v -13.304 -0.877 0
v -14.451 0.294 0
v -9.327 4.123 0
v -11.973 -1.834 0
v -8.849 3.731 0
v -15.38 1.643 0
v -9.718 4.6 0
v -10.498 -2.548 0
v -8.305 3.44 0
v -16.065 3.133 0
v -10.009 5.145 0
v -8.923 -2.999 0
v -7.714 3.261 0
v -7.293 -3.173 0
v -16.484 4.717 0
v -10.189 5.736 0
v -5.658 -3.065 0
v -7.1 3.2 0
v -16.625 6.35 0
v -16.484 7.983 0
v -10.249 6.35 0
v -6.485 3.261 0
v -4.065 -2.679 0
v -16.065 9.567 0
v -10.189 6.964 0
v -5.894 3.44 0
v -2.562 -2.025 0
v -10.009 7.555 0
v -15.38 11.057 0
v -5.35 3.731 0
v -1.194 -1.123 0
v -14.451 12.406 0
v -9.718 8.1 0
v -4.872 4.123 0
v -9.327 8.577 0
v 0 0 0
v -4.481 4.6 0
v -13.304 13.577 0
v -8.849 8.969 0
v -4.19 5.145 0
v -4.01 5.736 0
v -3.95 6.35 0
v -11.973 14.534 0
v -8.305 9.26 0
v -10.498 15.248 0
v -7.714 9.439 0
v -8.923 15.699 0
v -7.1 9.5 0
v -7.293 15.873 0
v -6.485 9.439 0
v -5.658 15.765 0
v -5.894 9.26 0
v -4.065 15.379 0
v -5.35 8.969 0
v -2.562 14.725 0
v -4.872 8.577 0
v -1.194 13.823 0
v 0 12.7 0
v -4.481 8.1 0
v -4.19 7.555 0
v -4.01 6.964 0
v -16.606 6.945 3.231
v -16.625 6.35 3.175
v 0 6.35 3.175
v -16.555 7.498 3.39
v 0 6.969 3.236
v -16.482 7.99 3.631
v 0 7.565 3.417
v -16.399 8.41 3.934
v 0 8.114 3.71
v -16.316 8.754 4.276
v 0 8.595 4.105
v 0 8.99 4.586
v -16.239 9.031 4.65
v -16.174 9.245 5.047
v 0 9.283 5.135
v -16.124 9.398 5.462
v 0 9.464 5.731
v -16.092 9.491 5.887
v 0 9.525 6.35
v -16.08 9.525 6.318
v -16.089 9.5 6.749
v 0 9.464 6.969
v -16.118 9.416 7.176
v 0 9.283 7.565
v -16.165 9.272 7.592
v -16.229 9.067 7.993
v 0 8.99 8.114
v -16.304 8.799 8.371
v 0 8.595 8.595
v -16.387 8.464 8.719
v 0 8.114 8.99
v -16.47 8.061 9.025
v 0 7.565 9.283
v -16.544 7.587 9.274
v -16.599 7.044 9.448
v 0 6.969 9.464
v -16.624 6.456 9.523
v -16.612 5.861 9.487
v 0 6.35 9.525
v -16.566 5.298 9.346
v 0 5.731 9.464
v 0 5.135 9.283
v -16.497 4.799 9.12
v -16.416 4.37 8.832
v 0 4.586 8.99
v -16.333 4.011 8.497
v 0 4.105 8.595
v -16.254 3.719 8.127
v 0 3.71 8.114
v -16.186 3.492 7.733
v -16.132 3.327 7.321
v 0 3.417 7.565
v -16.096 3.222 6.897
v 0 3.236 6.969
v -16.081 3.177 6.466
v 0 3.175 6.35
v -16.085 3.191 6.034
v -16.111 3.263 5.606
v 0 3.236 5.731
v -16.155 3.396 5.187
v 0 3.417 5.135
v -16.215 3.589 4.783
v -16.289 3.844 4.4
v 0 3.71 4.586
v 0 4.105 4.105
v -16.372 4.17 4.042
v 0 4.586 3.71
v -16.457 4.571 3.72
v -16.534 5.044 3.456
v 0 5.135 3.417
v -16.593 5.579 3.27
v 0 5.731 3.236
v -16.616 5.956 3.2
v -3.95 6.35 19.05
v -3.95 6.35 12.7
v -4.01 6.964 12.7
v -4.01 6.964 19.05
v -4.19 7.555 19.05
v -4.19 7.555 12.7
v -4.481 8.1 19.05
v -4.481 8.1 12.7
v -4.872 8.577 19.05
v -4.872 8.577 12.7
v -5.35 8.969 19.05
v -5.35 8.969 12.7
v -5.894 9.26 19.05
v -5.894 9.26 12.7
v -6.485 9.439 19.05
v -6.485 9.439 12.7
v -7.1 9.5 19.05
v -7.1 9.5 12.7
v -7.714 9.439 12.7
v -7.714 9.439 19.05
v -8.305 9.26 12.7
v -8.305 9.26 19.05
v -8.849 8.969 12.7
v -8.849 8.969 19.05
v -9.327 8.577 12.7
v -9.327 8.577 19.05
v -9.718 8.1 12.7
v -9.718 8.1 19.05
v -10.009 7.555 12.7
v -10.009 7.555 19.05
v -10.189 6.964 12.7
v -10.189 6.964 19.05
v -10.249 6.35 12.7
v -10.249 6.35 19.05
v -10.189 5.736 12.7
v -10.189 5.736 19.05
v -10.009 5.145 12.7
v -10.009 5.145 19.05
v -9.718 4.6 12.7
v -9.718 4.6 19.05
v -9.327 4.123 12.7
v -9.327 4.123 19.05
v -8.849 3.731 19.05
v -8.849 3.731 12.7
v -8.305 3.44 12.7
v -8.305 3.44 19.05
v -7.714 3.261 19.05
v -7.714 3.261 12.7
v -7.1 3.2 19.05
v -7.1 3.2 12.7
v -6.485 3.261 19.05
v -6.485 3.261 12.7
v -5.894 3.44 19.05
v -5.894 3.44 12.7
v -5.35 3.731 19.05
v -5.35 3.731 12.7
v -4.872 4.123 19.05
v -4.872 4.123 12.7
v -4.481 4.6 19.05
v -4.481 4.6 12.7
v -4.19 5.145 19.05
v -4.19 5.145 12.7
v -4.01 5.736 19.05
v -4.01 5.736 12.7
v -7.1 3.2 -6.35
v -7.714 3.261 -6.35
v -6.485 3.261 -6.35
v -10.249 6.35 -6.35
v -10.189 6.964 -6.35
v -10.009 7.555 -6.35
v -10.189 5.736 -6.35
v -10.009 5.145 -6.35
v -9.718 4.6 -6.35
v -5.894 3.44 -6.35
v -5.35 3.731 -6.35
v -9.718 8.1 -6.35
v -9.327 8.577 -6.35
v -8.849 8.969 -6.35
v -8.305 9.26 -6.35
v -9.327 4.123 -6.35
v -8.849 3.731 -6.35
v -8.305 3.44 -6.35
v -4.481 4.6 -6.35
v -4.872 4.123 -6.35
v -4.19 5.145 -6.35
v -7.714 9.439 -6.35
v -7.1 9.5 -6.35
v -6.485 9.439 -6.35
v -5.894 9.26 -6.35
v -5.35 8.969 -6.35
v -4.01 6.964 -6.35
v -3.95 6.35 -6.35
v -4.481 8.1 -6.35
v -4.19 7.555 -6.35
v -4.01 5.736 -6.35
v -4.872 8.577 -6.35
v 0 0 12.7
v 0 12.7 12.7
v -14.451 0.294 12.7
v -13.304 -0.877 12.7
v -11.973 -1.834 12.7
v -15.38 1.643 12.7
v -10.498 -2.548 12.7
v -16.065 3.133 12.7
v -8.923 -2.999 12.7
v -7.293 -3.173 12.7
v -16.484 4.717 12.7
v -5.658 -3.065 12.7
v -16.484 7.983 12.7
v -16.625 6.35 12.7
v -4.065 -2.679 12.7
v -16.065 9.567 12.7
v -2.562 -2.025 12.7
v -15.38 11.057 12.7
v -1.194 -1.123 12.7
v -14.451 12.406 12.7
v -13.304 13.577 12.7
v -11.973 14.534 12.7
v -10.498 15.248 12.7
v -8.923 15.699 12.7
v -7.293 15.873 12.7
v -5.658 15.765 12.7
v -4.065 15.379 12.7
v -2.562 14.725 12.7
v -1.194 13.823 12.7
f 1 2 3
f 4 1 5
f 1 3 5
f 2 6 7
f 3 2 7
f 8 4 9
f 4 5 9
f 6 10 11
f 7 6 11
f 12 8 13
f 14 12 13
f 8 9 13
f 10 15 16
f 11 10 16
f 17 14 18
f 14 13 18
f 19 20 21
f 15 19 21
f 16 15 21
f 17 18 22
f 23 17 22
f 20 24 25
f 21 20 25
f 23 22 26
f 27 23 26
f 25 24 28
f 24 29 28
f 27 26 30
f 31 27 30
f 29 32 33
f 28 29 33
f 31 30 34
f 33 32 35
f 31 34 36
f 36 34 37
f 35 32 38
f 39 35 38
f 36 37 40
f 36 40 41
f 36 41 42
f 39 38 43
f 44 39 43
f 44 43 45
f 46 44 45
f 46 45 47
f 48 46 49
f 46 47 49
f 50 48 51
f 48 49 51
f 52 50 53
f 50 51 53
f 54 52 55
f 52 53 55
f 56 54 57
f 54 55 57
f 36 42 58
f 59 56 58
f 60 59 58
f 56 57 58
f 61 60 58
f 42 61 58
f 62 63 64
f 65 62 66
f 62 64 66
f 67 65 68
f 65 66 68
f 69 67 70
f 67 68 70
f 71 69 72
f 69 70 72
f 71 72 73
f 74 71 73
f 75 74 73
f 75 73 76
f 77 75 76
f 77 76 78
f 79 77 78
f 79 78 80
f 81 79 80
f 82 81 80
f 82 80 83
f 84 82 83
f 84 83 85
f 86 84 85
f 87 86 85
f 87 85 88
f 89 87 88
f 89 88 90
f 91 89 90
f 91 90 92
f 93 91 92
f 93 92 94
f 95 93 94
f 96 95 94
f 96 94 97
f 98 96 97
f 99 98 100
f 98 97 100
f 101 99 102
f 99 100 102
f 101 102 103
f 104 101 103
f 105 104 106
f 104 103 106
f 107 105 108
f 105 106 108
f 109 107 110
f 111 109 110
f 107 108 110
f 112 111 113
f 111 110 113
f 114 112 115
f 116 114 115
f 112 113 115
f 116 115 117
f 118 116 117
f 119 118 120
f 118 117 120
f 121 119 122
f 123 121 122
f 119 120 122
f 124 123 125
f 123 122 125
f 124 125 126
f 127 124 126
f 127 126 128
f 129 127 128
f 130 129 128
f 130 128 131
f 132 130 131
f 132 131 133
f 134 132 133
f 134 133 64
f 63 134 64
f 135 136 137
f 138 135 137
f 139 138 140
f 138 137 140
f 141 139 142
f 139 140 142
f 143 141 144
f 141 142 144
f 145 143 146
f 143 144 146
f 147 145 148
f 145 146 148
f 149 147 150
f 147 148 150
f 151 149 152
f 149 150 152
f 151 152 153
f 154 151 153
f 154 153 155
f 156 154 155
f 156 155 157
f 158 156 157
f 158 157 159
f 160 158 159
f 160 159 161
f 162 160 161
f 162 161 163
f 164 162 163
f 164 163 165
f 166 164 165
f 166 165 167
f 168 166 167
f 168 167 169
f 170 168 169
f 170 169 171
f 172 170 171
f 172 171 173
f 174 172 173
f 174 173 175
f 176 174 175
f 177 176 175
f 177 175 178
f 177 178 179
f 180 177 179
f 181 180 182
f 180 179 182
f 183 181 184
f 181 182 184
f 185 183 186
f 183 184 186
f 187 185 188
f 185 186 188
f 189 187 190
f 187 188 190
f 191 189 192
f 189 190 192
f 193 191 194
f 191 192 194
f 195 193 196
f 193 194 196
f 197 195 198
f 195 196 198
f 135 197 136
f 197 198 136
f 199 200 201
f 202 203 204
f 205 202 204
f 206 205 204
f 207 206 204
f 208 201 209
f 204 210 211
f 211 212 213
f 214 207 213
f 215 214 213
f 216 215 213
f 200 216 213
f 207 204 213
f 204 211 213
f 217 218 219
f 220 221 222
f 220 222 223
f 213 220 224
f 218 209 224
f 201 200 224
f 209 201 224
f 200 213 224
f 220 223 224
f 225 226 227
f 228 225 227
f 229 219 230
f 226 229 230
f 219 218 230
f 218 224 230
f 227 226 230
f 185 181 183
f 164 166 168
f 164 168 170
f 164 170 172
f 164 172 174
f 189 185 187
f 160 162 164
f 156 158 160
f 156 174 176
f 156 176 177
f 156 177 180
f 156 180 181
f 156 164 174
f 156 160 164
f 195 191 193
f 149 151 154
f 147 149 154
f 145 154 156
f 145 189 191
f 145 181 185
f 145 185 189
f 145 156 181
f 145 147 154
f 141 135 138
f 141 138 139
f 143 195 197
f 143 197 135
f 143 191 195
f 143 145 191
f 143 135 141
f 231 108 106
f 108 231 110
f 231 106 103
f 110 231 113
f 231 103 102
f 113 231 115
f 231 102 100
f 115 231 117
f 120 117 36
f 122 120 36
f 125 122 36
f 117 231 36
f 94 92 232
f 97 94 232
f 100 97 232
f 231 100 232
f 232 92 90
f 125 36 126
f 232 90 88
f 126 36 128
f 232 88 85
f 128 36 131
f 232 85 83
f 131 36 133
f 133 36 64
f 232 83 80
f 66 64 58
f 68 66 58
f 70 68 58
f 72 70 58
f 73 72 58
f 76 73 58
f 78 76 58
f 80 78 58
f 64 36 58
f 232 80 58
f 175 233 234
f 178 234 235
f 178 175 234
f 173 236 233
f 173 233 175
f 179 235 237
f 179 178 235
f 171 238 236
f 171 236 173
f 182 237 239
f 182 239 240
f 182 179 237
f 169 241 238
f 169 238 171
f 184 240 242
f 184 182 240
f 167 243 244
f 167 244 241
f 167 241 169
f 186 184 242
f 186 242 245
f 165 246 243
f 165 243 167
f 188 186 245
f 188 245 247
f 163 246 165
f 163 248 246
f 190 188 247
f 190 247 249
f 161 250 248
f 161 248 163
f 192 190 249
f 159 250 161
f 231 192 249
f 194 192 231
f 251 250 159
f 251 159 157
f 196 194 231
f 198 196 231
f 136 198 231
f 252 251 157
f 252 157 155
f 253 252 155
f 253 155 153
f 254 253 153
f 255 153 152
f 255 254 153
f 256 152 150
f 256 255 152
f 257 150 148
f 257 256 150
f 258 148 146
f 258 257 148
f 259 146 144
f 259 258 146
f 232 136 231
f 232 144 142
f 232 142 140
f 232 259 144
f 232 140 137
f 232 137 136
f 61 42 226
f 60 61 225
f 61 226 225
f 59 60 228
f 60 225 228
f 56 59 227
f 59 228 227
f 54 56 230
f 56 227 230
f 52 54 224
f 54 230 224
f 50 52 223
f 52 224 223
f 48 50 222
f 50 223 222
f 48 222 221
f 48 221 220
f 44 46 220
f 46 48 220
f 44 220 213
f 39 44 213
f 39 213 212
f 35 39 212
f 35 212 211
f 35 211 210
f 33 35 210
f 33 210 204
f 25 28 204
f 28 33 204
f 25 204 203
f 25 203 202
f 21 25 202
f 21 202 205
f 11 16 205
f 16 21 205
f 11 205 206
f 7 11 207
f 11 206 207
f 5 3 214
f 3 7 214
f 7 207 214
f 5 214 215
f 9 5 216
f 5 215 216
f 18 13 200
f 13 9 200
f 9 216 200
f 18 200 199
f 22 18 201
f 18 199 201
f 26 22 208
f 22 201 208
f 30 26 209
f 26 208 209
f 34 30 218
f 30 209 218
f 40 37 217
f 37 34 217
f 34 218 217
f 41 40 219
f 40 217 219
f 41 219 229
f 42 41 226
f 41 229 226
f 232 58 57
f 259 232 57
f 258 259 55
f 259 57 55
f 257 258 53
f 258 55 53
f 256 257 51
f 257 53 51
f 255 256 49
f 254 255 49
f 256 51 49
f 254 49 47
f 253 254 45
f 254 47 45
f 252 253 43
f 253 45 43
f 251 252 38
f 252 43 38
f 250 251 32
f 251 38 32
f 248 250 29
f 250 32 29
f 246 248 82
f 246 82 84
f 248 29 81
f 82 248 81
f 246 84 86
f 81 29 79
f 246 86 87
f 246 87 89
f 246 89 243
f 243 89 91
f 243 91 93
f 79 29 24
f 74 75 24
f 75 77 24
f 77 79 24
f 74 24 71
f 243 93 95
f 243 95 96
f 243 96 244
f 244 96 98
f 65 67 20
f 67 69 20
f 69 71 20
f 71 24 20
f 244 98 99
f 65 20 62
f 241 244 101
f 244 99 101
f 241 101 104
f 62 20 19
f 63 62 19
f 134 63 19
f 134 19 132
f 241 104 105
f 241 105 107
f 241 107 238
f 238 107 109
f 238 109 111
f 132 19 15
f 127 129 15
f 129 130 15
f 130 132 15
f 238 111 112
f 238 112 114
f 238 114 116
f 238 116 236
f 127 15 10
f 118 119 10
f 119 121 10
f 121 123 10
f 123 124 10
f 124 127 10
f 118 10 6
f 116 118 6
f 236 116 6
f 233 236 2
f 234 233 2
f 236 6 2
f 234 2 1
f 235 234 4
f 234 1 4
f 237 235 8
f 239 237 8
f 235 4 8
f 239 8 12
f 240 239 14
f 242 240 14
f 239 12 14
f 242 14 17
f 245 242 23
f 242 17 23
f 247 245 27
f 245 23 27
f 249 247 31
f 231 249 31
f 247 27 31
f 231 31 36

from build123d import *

# Parameters (mm, degrees)
BOSS_EXTRUDE1_DEPTH      = 12.7
BOSS_EXTRUDE2_DEPTH      = 6.35
BOSS_EXTRUDE2_DEPTH_BACK = 19.05
SKETCH3_R                = 3.1496
SKETCH4_R                = 3.175
CUT_EXTRUDE1_DEPTH       = 30.854524808


with BuildPart() as part:
    # Sketch1 → Boss-Extrude1 (new body)
    with BuildSketch(Plane.XY):
        with BuildLine():
            Line((0, 0), (0, 12.7))
            ThreePointArc((0, 12.7), (-16.624515829, 6.35), (0, 0))
        make_face()
    extrude(amount=BOSS_EXTRUDE1_DEPTH)

    # Sketch3 → Boss-Extrude2 (add, two sides: drawn at the far end of the back side and taken through both)
    with BuildSketch(Plane.XY.offset(12.7).offset(-BOSS_EXTRUDE2_DEPTH_BACK)):
        with Locations((-7.099515829, 6.35)):
            Circle(SKETCH3_R)
    extrude(amount=BOSS_EXTRUDE2_DEPTH + BOSS_EXTRUDE2_DEPTH_BACK)

    # Sketch4 → Cut-Extrude1 (cut, through all)
    with BuildSketch(Plane(origin=(0, 0, 0), x_dir=(0, 0, -1), z_dir=(1, 0, 0))):
        with Locations((-6.35, 6.35)):
            Circle(SKETCH4_R)
    extrude(amount=-CUT_EXTRUDE1_DEPTH, mode=Mode.SUBTRACT)


solid = part.part
